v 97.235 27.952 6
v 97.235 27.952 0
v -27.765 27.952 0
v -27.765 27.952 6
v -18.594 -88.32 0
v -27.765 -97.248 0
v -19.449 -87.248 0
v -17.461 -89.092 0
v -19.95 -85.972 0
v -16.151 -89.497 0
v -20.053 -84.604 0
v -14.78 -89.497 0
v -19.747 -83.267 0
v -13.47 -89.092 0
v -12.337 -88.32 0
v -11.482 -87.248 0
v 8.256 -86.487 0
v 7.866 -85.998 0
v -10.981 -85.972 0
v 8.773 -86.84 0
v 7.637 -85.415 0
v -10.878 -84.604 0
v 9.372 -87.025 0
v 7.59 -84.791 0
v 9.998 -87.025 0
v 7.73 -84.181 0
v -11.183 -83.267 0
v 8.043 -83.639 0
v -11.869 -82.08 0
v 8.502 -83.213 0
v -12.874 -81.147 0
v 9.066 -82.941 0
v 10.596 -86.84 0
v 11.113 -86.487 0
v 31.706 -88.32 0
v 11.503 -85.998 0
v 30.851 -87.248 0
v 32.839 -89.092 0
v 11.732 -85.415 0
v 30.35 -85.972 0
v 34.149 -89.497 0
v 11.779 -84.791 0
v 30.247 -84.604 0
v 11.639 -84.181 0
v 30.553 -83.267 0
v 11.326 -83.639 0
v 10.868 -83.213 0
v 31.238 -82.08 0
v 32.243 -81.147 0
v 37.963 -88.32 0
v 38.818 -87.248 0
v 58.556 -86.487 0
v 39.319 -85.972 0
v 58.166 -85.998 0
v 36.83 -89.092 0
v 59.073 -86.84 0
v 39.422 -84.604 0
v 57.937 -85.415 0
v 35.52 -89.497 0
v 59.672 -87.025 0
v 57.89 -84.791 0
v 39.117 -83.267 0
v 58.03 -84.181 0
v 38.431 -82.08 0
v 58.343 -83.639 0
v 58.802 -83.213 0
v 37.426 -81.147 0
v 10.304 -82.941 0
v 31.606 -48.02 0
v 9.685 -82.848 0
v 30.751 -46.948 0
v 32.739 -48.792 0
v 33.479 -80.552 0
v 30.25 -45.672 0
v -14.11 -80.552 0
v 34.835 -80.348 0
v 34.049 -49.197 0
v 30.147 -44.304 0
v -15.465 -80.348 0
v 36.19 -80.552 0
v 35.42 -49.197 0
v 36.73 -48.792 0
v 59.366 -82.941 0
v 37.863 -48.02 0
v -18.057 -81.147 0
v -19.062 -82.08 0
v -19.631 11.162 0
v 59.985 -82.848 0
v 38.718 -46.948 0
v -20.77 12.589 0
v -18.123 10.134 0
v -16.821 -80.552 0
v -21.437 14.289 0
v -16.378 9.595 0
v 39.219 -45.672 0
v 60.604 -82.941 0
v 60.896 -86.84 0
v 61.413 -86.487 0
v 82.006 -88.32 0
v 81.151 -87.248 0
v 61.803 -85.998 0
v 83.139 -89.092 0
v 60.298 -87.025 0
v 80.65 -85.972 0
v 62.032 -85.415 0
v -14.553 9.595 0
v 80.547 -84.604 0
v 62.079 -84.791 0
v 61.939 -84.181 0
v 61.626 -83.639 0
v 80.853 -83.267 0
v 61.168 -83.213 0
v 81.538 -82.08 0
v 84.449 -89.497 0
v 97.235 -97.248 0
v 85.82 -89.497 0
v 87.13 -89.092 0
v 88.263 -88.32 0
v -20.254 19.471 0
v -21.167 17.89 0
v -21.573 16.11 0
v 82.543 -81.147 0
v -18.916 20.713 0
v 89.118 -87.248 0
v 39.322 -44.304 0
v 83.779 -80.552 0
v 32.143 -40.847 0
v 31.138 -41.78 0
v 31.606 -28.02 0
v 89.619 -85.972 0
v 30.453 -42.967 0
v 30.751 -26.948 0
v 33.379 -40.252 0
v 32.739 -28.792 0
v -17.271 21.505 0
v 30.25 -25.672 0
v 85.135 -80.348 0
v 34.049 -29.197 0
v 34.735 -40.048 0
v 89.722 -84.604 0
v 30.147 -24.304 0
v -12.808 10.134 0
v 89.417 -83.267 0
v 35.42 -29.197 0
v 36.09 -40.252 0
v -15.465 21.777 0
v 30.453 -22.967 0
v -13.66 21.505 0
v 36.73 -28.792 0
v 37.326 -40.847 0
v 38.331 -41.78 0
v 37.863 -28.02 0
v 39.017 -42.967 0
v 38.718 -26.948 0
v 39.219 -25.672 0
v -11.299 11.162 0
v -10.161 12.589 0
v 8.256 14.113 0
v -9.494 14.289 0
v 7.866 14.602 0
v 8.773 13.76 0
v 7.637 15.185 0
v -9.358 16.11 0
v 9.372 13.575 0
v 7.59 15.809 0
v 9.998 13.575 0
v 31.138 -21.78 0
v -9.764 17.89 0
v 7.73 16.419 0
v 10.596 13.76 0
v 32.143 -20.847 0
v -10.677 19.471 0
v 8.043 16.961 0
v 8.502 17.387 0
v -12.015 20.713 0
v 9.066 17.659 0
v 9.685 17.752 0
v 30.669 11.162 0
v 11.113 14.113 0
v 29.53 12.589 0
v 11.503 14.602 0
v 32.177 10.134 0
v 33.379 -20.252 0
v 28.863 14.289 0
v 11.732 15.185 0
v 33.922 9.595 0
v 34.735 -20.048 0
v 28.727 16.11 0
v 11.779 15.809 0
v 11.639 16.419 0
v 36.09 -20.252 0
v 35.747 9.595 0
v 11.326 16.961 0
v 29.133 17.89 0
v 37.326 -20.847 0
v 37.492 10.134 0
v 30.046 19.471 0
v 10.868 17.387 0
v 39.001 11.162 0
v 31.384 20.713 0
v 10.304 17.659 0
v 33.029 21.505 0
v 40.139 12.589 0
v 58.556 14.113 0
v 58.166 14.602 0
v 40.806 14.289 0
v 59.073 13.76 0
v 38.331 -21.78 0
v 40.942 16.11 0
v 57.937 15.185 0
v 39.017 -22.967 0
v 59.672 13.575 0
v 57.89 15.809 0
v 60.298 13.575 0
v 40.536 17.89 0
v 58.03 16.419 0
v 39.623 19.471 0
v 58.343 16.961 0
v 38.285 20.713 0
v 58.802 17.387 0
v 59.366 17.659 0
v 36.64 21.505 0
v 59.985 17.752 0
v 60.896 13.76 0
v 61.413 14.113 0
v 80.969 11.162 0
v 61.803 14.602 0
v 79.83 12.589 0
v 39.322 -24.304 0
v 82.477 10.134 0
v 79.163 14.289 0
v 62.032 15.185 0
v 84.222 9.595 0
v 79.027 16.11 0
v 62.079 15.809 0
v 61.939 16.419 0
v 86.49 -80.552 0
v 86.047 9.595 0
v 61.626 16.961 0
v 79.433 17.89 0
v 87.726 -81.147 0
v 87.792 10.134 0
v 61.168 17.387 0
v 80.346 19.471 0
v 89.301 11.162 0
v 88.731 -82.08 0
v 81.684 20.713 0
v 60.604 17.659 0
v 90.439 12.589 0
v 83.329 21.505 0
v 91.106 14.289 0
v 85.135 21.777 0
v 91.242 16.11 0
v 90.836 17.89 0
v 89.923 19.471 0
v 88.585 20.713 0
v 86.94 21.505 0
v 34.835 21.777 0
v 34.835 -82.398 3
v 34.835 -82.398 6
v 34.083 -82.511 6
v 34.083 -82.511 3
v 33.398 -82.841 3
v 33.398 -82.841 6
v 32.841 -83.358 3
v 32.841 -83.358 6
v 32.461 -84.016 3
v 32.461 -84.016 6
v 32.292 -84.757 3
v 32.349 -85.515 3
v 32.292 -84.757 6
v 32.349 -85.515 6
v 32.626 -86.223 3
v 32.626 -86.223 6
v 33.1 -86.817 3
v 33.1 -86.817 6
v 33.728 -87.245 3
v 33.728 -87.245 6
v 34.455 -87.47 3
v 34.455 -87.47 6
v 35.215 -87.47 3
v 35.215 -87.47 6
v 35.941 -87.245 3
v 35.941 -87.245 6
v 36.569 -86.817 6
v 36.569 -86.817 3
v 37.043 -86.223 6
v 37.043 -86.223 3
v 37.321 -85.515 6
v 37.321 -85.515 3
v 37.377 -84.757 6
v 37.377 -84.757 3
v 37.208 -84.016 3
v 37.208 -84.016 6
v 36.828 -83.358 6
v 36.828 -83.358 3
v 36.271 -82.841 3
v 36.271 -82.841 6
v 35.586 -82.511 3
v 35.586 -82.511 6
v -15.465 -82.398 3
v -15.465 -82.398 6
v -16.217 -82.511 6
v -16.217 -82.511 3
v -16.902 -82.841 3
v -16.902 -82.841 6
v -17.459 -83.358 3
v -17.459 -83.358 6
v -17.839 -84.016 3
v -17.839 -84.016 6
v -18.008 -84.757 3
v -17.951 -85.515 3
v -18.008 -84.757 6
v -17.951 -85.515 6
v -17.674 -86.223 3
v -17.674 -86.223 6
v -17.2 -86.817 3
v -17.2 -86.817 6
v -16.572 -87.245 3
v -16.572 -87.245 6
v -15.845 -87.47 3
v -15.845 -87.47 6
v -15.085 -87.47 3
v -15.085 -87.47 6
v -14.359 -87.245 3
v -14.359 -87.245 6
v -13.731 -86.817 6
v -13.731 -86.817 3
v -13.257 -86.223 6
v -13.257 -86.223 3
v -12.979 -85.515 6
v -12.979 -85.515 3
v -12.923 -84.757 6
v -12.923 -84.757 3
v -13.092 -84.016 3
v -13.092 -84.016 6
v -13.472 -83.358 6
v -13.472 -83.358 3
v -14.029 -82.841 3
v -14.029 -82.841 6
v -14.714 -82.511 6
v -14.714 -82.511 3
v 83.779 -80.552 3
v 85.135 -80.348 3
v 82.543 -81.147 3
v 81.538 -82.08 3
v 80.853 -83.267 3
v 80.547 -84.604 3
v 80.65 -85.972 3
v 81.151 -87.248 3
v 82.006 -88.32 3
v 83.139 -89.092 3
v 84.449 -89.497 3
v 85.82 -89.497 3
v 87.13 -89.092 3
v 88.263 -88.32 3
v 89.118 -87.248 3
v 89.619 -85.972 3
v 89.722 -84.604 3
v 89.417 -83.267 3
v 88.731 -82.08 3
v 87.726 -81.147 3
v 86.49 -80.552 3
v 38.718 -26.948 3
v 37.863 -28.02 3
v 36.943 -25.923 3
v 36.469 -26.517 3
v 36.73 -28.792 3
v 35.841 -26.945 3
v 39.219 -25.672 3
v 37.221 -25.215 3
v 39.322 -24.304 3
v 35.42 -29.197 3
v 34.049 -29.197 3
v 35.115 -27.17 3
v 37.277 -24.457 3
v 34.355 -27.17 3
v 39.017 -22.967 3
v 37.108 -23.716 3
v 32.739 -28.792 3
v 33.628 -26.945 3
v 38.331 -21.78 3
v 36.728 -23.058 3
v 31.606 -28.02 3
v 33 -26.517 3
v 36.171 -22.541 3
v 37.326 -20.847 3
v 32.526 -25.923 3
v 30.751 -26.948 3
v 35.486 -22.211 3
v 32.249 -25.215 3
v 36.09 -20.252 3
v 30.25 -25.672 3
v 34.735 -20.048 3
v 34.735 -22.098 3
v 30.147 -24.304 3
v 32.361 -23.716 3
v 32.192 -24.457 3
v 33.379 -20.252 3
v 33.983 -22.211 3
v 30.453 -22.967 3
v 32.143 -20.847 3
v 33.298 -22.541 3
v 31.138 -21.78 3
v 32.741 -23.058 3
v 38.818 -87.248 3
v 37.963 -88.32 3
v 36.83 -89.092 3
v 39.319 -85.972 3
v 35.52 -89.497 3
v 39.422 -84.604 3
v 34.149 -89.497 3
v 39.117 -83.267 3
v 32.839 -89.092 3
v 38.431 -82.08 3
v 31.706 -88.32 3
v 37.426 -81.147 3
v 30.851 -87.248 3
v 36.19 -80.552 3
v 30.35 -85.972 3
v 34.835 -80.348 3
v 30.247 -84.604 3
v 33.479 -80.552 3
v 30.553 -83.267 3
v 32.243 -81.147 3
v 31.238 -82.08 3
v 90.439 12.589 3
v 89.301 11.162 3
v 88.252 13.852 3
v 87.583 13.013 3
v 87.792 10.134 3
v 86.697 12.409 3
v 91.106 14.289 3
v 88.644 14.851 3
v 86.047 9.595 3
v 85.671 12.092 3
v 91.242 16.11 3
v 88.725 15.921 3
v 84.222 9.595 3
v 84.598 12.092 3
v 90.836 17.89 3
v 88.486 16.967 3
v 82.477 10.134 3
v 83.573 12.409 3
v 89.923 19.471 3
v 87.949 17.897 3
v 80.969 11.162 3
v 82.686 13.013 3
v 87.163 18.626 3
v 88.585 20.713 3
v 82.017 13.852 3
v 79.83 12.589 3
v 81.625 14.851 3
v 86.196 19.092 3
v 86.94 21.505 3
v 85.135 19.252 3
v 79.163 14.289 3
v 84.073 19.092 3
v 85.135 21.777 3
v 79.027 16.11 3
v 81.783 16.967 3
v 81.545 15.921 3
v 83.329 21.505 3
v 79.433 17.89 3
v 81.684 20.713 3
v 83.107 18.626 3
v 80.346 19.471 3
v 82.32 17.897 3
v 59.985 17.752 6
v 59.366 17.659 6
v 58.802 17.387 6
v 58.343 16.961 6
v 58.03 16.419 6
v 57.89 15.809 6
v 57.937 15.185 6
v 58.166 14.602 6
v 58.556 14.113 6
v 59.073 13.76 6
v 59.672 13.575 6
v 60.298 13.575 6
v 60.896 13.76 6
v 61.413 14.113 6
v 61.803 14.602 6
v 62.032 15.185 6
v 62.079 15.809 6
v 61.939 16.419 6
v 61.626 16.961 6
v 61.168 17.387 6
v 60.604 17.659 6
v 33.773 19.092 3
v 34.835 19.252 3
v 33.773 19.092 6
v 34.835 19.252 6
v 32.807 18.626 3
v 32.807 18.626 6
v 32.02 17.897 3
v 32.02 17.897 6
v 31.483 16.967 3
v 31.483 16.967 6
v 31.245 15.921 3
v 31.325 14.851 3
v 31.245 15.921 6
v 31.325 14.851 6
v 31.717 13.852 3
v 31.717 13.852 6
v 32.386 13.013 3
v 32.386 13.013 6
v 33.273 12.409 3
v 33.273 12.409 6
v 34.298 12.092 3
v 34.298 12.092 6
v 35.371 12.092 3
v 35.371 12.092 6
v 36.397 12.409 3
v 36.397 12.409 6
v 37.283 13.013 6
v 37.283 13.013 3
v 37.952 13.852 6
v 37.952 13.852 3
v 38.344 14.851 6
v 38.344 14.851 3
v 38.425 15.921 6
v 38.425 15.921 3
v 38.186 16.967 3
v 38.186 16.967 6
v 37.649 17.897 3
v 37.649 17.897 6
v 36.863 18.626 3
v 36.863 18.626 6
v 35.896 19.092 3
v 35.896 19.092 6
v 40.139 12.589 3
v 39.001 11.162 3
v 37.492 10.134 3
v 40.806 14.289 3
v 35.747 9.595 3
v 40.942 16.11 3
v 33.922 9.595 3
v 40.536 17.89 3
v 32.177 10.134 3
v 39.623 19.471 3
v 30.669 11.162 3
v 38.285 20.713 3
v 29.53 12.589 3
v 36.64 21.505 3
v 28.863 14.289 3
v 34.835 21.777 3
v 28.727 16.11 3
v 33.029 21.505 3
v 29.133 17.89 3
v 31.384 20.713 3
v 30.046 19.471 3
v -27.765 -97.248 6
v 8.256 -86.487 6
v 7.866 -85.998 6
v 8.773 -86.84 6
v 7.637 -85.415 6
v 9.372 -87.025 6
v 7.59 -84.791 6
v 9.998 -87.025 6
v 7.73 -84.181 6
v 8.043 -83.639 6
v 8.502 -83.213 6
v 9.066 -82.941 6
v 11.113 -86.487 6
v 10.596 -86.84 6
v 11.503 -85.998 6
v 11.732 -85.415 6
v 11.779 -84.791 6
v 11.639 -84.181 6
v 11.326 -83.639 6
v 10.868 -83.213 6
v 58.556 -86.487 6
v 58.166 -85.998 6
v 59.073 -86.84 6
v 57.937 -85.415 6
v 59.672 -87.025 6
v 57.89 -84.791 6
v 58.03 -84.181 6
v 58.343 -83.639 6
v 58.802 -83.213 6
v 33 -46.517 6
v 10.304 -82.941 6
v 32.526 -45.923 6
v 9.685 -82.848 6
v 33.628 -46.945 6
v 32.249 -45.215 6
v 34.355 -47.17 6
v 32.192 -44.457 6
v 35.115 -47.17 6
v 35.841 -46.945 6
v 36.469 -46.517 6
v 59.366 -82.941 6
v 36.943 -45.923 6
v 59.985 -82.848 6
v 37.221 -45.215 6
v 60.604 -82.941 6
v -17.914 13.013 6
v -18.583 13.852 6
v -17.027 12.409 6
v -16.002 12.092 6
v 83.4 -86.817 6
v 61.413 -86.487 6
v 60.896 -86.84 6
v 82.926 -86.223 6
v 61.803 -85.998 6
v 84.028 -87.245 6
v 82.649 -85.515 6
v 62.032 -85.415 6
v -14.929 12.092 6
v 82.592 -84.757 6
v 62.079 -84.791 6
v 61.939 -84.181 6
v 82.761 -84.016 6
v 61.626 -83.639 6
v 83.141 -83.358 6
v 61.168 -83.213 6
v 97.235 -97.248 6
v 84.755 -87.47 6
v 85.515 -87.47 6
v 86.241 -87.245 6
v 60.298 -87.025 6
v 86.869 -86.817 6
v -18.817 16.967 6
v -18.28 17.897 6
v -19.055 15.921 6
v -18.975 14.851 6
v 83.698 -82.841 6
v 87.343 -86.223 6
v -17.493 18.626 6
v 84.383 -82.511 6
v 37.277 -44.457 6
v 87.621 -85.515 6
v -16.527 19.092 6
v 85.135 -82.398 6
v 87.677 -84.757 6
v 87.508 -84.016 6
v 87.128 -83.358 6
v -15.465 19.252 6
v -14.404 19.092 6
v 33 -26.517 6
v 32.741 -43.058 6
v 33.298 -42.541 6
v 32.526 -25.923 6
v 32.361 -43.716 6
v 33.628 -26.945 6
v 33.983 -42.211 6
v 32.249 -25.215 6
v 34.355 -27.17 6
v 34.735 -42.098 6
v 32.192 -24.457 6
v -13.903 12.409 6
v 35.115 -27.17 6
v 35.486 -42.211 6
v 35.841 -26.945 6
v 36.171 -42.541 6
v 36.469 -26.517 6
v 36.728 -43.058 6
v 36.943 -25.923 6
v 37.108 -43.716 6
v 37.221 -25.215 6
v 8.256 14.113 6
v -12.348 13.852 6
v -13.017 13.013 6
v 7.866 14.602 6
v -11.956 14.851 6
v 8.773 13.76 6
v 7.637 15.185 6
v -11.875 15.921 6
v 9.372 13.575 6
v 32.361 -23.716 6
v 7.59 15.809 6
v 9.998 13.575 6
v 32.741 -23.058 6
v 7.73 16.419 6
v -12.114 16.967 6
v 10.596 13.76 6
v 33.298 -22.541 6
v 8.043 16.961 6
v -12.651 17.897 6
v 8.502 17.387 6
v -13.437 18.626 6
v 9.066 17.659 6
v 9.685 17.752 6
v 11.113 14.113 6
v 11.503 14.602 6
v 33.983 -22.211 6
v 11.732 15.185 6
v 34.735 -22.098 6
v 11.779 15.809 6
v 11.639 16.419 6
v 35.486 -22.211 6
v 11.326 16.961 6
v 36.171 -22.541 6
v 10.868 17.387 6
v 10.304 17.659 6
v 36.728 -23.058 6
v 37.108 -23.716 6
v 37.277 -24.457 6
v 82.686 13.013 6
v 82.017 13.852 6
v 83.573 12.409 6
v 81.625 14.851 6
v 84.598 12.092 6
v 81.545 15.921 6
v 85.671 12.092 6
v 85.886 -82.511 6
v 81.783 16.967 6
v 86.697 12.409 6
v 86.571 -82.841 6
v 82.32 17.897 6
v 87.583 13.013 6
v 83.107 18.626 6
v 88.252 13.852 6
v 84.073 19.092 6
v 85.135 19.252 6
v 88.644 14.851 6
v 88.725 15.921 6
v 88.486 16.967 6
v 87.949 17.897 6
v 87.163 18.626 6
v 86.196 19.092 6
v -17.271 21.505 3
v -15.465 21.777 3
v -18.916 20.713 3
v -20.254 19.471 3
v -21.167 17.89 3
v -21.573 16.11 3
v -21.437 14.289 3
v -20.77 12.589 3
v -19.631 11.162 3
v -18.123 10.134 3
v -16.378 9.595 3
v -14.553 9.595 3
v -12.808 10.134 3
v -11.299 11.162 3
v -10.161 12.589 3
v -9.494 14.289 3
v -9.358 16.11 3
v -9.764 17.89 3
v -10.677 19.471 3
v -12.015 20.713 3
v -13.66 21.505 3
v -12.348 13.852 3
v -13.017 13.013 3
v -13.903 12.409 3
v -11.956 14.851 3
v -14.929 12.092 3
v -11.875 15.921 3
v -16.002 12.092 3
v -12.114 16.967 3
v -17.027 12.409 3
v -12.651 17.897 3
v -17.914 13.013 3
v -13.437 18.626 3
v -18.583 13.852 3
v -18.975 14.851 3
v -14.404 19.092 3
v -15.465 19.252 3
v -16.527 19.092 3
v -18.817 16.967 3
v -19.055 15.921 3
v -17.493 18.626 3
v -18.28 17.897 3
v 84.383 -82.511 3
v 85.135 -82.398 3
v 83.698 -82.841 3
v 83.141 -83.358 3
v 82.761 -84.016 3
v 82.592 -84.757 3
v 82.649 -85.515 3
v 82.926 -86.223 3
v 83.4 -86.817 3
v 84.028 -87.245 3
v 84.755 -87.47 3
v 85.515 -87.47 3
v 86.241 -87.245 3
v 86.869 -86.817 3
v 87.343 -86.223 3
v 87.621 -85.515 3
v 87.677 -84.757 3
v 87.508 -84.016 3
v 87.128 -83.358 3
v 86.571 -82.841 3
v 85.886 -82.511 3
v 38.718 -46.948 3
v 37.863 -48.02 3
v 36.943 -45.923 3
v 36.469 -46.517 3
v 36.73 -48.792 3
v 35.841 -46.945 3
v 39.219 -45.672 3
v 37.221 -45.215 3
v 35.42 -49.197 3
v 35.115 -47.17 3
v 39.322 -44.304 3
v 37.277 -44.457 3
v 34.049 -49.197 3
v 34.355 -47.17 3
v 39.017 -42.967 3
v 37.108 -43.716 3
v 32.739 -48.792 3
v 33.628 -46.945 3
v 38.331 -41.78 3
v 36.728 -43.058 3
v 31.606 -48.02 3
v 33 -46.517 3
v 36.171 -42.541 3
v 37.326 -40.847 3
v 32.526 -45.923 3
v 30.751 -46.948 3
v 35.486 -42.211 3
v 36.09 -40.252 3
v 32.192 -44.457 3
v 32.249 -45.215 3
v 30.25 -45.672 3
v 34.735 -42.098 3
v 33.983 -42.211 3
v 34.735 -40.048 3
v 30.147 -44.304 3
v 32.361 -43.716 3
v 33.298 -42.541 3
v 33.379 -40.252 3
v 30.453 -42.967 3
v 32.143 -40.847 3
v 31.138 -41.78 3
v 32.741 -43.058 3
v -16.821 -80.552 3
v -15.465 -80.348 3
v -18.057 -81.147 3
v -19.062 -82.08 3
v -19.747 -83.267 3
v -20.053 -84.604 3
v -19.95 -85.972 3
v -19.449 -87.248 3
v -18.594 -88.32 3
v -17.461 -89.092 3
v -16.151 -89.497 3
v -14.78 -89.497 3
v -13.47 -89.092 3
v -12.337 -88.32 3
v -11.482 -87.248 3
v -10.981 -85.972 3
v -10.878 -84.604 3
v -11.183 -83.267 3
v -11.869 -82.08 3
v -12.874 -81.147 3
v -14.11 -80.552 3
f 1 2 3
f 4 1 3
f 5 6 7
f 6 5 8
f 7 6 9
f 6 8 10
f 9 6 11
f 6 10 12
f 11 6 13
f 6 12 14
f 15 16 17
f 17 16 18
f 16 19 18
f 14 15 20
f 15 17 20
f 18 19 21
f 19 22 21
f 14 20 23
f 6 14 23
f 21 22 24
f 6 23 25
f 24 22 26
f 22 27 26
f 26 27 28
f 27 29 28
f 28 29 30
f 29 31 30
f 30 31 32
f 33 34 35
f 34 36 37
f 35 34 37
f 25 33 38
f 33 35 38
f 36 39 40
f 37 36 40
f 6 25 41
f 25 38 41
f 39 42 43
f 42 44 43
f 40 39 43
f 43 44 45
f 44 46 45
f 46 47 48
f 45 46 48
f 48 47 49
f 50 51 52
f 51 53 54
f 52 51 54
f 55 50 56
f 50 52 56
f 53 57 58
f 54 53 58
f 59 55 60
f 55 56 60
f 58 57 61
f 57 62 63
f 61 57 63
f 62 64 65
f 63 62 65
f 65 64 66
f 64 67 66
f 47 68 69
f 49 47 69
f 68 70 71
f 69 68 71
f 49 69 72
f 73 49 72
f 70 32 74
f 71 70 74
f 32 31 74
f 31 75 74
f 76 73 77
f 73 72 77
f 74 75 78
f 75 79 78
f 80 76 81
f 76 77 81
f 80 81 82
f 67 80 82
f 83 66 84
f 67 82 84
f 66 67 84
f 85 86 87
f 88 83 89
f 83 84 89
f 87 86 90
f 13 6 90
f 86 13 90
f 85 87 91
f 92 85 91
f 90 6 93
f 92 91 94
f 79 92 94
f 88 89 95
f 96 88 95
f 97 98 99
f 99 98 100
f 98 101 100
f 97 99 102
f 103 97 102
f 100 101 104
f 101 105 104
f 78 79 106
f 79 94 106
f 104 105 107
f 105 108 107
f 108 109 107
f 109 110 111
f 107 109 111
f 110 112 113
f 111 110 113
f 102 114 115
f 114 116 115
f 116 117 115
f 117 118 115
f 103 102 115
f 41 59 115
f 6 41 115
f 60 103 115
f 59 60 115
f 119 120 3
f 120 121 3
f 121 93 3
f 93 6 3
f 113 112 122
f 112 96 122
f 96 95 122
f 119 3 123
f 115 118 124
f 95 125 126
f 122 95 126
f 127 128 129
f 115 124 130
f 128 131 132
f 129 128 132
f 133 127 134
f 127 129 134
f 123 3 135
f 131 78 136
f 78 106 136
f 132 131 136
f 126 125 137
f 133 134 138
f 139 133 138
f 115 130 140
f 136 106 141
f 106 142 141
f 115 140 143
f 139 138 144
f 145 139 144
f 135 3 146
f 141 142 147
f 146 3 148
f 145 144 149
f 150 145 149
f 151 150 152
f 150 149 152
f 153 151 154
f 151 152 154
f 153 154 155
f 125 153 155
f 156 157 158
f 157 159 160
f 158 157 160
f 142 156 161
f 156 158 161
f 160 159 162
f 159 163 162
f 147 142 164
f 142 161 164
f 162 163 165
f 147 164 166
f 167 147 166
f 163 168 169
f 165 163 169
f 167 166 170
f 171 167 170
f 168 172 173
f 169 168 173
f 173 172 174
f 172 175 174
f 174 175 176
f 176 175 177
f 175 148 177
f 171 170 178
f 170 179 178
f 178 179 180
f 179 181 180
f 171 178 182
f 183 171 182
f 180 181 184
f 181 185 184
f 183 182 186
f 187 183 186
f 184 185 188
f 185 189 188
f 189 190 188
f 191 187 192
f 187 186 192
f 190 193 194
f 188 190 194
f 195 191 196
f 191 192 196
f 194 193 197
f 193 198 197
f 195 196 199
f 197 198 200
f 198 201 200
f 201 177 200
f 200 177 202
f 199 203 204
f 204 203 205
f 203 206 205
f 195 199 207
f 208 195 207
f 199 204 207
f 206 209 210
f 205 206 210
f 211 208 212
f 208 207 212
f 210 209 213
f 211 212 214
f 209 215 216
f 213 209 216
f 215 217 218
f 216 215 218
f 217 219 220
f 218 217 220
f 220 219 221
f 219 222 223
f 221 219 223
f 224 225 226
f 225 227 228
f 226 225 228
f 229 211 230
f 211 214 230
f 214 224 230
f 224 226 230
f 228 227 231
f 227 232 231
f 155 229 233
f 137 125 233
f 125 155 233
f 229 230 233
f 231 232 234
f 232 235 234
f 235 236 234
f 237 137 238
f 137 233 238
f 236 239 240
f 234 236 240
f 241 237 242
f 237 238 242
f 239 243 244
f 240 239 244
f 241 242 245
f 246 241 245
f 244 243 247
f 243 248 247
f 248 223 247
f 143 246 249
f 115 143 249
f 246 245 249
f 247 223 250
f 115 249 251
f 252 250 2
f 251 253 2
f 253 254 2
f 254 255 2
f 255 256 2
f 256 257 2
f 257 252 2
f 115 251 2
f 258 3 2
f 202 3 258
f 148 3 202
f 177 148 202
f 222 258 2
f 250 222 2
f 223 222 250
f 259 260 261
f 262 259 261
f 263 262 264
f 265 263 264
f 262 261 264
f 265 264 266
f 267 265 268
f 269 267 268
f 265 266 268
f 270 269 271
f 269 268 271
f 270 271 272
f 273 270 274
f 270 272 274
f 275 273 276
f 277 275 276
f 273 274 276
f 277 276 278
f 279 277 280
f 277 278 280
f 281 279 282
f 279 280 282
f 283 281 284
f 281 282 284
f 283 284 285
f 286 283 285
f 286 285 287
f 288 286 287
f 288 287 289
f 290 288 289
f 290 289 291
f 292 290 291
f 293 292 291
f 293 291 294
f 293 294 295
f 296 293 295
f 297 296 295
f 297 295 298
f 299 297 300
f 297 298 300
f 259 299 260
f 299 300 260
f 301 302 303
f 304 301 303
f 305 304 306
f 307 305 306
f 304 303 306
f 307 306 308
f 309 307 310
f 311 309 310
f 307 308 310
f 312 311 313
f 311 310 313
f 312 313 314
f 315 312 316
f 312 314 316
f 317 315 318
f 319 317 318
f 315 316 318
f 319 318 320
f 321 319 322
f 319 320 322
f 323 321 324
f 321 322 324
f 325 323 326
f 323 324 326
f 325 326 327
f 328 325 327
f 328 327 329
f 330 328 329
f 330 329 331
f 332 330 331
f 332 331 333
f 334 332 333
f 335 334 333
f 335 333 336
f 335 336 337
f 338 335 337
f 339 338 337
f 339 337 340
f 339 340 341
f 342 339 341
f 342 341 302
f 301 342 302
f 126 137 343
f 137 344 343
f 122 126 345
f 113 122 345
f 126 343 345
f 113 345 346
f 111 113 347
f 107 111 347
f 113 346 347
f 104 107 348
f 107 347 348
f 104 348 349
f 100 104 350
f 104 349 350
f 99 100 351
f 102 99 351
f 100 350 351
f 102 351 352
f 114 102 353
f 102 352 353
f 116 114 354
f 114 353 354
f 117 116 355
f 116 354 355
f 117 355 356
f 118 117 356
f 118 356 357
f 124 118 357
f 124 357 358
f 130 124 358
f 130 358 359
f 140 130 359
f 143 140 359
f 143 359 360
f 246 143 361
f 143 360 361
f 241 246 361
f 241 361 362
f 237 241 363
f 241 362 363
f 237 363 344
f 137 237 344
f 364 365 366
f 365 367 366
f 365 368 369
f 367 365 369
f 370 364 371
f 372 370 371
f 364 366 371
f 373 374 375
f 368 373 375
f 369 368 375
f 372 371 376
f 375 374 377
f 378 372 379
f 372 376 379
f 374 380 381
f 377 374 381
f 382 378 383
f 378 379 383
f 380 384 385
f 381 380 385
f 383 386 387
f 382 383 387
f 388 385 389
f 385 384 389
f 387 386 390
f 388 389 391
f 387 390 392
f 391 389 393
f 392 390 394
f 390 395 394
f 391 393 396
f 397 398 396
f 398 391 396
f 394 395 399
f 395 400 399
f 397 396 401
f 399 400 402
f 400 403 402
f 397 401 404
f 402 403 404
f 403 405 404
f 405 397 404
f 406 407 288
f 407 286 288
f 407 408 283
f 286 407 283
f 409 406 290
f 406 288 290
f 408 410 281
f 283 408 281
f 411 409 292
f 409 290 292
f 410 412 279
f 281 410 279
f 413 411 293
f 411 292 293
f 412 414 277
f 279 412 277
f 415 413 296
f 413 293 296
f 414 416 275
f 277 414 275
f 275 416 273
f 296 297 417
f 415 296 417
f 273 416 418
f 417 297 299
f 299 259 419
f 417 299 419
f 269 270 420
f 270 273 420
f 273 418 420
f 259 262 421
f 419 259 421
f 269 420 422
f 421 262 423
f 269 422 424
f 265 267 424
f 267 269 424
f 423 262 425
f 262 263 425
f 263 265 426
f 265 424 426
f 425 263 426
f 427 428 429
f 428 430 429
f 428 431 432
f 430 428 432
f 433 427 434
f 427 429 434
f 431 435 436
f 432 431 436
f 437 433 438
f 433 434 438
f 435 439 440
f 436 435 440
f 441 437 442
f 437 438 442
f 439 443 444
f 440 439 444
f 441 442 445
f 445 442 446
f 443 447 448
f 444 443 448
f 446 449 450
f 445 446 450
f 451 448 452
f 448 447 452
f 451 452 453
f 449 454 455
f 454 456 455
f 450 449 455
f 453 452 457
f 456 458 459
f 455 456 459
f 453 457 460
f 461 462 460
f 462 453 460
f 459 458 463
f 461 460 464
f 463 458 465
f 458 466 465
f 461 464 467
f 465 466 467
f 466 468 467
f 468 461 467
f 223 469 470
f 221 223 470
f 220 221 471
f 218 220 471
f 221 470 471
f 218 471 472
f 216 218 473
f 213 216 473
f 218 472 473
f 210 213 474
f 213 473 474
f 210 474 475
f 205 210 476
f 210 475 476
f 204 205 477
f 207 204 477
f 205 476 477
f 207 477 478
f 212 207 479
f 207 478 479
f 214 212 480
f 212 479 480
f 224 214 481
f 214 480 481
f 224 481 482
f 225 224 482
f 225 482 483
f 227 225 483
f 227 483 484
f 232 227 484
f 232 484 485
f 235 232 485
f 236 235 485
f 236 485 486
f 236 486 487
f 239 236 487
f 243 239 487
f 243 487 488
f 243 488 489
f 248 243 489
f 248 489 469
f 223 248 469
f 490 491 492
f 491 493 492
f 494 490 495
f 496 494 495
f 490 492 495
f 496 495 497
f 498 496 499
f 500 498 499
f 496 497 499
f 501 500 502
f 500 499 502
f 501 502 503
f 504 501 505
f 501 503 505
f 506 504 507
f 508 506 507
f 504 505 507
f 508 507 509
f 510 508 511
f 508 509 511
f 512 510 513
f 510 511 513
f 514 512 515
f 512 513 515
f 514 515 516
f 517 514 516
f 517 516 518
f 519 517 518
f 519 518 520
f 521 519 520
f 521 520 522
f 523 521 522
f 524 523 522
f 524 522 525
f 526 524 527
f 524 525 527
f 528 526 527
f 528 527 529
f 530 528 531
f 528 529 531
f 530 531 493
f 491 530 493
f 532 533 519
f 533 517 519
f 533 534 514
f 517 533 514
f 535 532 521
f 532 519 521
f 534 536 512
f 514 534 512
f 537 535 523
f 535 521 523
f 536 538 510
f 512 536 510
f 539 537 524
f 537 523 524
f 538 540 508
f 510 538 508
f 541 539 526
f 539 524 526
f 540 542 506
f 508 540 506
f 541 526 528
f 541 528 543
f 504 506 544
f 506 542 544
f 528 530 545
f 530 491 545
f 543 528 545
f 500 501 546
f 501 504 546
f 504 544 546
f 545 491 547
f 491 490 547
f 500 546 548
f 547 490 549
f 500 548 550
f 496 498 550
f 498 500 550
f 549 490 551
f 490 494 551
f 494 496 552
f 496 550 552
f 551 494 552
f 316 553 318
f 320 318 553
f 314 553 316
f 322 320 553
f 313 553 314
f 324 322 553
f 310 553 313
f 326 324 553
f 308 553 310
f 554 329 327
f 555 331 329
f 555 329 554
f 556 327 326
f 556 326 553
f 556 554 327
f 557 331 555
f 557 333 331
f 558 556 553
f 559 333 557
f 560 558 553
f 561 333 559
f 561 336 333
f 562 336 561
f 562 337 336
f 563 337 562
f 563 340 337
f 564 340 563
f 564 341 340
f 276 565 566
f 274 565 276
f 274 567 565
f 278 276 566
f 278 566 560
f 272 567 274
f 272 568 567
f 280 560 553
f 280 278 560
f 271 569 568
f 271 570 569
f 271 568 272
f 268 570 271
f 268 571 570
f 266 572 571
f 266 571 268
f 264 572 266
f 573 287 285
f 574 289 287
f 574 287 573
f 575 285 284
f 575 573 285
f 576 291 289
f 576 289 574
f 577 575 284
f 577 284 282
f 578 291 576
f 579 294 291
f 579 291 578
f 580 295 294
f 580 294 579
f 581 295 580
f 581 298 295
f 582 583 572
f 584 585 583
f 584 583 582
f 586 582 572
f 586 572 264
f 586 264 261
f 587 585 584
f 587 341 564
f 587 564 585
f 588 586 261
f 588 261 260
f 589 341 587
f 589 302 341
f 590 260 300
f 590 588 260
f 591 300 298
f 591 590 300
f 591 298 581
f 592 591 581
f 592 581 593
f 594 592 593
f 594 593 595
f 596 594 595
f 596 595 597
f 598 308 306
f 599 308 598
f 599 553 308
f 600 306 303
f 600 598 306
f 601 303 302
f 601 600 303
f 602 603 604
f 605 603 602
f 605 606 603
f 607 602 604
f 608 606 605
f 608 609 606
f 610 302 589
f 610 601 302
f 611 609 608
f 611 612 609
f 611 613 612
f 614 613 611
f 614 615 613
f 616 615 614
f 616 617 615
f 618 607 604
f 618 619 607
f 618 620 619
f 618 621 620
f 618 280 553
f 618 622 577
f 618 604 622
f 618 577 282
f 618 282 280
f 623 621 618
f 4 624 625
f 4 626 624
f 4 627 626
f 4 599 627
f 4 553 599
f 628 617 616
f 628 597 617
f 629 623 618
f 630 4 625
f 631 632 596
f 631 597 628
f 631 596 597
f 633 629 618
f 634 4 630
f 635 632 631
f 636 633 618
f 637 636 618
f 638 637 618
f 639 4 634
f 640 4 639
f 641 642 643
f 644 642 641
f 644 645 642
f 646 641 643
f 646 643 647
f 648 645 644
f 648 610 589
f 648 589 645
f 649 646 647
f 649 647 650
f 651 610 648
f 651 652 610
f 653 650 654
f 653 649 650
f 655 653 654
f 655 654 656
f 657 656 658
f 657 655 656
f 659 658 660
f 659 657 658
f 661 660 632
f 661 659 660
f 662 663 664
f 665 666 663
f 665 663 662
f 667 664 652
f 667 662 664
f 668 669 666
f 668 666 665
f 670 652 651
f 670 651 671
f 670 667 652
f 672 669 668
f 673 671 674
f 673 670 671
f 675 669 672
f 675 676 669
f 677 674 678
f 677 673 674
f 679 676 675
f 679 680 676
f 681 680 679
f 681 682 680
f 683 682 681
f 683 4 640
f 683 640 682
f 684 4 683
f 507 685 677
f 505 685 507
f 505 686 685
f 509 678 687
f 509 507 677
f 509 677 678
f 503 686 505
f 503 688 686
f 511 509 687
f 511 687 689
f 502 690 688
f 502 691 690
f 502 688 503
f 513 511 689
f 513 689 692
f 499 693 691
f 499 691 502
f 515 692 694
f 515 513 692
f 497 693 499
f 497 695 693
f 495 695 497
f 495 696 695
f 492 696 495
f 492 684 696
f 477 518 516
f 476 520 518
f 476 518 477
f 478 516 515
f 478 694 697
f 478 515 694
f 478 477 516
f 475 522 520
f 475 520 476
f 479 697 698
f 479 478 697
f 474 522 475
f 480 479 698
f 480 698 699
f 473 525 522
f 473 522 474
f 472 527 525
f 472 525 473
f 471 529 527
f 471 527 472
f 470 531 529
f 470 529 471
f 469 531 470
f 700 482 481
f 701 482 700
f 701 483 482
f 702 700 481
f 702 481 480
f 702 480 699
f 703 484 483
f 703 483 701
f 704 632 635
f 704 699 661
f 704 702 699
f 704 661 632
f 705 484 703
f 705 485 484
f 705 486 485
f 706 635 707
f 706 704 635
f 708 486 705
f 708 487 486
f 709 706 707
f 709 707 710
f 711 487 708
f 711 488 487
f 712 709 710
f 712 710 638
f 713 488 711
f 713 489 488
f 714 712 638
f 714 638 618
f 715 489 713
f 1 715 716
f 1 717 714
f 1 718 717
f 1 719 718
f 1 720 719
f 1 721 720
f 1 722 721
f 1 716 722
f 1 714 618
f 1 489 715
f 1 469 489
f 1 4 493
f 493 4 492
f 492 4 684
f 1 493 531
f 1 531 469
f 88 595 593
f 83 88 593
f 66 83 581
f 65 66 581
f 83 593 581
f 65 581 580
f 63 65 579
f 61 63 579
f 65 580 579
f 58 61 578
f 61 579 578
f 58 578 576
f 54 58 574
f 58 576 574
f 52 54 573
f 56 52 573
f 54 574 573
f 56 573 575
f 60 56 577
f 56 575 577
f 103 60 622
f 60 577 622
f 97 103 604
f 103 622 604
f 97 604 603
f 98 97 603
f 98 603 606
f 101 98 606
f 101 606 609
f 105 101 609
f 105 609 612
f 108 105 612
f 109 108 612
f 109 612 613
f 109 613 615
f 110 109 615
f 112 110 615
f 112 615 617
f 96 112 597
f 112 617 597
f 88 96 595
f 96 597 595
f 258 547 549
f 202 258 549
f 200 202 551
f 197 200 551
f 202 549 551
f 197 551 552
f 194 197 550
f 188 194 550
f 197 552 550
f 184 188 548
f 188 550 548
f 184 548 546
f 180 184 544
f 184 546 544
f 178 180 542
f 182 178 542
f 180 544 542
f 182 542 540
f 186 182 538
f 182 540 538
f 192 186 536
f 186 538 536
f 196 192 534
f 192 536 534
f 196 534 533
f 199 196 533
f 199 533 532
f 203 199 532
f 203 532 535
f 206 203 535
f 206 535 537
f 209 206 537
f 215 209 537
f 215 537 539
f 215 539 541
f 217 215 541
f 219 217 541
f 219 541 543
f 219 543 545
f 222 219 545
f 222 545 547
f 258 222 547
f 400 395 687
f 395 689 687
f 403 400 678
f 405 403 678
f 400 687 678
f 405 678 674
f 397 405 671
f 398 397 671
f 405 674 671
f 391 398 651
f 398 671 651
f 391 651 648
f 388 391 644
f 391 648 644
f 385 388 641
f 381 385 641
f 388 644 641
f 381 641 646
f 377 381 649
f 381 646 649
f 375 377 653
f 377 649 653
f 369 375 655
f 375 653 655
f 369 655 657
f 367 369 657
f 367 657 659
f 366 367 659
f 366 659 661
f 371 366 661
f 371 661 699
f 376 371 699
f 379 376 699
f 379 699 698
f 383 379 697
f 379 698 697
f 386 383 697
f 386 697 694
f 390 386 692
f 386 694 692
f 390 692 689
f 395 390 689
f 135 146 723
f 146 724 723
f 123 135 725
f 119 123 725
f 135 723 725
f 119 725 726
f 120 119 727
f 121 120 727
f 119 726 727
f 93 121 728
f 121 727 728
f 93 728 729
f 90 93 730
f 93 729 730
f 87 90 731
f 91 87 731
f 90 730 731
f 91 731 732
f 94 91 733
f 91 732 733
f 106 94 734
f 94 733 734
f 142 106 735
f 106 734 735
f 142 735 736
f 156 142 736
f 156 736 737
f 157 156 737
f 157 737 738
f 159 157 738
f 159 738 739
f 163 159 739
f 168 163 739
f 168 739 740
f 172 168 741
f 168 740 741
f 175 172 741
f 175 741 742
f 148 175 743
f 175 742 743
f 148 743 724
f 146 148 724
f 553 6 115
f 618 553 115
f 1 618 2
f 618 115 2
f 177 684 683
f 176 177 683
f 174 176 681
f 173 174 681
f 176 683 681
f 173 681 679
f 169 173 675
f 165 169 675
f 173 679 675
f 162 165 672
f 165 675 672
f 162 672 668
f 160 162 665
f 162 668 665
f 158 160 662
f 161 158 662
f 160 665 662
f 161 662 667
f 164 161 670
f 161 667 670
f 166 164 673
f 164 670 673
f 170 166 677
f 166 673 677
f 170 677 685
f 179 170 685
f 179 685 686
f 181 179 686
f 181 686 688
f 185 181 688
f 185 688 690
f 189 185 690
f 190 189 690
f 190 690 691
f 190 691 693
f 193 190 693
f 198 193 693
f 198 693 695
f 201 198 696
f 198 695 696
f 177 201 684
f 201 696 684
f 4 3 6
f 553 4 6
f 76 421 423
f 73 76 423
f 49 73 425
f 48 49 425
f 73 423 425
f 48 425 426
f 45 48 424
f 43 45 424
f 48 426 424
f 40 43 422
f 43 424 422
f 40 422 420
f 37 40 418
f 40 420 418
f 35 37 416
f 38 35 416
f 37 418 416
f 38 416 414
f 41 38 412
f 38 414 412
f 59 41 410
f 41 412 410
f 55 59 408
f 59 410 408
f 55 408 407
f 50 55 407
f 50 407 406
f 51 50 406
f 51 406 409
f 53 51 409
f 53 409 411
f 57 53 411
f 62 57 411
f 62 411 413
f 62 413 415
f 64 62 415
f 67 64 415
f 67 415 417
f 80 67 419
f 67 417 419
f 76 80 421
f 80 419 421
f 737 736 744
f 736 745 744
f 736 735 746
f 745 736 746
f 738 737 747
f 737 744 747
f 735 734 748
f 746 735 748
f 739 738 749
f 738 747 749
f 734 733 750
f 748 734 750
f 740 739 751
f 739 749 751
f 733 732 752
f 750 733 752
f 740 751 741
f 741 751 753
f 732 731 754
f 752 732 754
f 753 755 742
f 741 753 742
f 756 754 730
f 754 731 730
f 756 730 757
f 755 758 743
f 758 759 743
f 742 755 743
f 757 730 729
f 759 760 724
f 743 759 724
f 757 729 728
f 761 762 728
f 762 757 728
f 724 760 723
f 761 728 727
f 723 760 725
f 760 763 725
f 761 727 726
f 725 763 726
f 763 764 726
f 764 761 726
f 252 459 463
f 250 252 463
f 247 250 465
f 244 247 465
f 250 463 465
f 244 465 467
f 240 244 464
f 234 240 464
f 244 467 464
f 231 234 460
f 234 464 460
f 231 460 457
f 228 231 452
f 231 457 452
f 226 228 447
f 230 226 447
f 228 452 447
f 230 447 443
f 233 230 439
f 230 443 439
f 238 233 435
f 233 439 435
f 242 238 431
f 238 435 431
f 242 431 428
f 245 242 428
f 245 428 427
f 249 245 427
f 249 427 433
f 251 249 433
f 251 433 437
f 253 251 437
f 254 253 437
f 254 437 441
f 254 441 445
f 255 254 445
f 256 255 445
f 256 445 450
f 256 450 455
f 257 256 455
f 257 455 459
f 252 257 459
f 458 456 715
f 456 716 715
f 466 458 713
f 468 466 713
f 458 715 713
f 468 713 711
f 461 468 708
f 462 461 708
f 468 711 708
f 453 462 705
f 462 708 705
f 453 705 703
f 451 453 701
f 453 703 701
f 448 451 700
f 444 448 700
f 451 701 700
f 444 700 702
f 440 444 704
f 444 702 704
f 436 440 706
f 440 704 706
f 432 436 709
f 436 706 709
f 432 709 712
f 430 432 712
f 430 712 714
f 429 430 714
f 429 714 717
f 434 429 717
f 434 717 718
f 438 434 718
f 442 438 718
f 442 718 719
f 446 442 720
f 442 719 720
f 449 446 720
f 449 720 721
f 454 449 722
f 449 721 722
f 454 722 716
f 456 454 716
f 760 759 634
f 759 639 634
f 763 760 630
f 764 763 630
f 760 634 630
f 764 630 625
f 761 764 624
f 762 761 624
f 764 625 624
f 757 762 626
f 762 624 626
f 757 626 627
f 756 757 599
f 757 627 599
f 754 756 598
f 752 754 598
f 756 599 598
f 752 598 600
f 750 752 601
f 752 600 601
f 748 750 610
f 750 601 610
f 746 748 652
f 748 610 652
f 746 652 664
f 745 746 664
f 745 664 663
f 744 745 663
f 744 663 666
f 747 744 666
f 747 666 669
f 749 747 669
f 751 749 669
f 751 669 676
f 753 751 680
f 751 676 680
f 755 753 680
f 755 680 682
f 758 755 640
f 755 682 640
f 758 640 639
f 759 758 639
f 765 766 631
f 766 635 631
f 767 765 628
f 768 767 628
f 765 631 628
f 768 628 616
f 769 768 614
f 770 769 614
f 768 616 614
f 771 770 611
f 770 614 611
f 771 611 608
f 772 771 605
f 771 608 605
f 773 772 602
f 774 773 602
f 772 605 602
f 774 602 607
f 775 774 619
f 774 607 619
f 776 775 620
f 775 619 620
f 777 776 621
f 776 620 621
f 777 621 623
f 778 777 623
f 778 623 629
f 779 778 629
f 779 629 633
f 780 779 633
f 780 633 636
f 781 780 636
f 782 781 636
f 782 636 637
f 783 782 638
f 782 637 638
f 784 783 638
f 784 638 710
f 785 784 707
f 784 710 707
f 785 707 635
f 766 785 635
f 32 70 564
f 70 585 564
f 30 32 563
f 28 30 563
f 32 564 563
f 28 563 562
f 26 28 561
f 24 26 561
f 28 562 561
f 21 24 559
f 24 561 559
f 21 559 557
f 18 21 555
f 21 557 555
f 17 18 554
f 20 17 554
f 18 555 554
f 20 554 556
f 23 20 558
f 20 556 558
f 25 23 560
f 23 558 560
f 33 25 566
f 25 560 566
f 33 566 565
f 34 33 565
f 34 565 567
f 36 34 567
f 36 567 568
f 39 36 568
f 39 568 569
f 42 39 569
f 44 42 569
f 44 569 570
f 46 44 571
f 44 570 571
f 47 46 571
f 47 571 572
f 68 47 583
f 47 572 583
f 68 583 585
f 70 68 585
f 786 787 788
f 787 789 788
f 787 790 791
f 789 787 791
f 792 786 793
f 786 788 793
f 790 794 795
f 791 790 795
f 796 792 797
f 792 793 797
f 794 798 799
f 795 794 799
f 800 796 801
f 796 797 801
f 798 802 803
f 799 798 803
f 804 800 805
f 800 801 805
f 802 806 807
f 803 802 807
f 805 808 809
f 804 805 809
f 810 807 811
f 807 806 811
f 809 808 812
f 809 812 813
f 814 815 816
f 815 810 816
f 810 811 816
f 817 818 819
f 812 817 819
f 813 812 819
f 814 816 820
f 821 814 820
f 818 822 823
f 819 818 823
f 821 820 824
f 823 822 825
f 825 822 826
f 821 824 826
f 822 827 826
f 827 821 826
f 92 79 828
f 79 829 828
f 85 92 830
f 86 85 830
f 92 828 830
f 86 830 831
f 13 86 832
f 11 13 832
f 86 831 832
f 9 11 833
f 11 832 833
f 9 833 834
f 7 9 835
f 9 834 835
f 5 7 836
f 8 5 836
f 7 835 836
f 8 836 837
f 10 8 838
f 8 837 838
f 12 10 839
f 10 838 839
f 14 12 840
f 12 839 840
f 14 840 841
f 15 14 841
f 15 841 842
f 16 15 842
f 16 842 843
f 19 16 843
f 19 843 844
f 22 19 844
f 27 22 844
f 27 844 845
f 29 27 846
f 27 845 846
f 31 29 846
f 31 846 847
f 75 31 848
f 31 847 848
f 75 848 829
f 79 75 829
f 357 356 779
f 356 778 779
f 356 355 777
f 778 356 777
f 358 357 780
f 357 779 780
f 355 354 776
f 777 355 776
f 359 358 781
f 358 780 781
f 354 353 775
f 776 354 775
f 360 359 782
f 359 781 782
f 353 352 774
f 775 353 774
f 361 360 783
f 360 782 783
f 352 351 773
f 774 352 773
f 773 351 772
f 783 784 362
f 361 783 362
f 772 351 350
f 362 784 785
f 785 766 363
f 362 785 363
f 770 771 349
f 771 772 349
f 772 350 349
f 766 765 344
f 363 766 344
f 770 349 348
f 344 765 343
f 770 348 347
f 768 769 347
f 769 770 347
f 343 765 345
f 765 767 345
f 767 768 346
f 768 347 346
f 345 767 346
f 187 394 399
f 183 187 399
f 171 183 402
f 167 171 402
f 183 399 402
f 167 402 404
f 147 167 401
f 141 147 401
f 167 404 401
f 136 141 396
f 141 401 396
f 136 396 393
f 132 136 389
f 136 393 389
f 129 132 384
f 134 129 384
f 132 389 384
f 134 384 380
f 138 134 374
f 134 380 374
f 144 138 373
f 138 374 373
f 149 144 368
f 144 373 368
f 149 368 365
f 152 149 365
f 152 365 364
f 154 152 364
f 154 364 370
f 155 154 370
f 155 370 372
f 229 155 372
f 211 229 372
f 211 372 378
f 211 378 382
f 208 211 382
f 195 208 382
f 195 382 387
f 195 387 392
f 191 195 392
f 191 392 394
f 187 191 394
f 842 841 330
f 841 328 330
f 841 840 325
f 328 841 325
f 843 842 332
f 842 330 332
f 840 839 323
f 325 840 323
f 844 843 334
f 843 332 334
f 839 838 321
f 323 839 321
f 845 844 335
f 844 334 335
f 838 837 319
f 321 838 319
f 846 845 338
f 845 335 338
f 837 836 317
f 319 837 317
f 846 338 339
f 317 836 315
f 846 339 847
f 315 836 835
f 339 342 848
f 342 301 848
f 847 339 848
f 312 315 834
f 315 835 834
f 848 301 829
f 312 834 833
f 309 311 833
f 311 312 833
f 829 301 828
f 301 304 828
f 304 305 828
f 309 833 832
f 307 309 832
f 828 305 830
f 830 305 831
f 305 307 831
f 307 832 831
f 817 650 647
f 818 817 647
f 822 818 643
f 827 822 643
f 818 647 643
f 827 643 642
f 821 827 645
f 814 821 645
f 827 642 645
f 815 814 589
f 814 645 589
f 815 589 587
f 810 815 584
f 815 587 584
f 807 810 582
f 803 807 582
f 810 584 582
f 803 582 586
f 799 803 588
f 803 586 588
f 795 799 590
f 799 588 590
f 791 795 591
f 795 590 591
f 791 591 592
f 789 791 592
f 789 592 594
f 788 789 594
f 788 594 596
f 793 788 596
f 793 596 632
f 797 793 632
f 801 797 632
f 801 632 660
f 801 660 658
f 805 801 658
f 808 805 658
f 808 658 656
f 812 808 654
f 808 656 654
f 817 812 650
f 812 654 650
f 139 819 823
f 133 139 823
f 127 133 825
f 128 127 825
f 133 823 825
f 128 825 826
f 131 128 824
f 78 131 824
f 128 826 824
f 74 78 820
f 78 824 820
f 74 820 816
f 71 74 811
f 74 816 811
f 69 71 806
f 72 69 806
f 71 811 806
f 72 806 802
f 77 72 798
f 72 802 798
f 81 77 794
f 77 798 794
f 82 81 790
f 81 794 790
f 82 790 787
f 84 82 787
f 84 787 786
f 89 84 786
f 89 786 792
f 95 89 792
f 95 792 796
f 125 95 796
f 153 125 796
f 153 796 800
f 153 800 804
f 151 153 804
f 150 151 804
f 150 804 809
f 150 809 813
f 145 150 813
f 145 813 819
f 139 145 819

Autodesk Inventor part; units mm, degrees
ref_plane "YZ Plane" through (0, 0, 0) normal (1, 0, 0) x (0, 1, 0)
ref_plane "XZ Plane" through (0, 0, 0) normal (0, 1, 0) x (-1, 0, 0)
ref_plane "XY Plane" through (0, 0, 0) normal (0, 0, 1) x (1, 0, 0)
sketch "Sketch1" plane through (0, 0, 0) normal (0, 0, 1) x (1, 0, 0)
  line L0 (97.2346, 27.952) -> (-27.7654, 27.952)
  line L1 (-27.7654, 27.952) -> (-27.7654, -97.248)
  line L2 (-27.7654, -97.248) -> (97.2346, -97.248)
  line L3 (97.2346, -97.248) -> (97.2346, 27.952)
  line L4 (85.1346, 27.952) -> (85.1346, -97.248) construction
  line L5 (-15.4654, 27.952) -> (-15.4654, -97.248) construction
  line L6 (-37.3152, 15.652) -> (117.1466, 15.652) construction
  line L7 (115.2487, -84.948) -> (-56.3615, -84.948) construction
  line L8 (34.8346, -156.7023) -> (34.8346, 57.8793) construction
  line L9 (59.9846, 68.2484) -> (59.9846, -132.2245) construction
  line L10 (9.6846, 55.4717) -> (9.6846, -128.574) construction
  point P0 (0, 0)
  point P1 (-65.7997, 171.2688)
  point P2 (85.1346, -84.948)
  point P3 (85.1346, 15.652)
  point P4 (-15.4654, 15.652)
  point P5 (-15.4654, -84.948)
  point P6 (34.8346, -84.948)
  point P7 (34.8346, 15.652)
  point P8 (59.9846, 15.652)
  point P9 (9.6846, 15.652)
  point P10 (59.9846, -84.948)
  point P11 (9.6846, -84.948)
  dimension "d0" = 125
  dimension "d1" = 125.2
  dimension "d6" = 100.6
  dimension "d48" = 12.3
  dimension "d49" = 100.6
  dimension "d50" = 50.3
  dimension "d72" = 25.15
  dimension "d73" = 25.15
extrude "Extrusion1" add sketch "Sketch1" along normal blind 6
hole "Hole6" at (85.1346, -84.948, 0) at (34.8346, -84.948, 0) at (-15.4654, -84.948, 0) direction (0, 0, 1) diameter 5.1 end through all counterbore diameter 9.2 counterbore depth 3
sketch "Sketch2" plane through (0, 0, 6) normal (0, 0, 1) x (1, 0, 0)
  line L0 (86.1945, -57.9789) -> (32.1694, -57.9789) construction
  line L1 (32.1694, -57.9789) -> (32.1694, -50.1092) construction
  line L2 (32.1694, -50.1092) -> (86.1945, -50.1092) construction
  line L3 (86.1945, -50.1092) -> (86.1945, -57.9789) construction
  point P0 (0, 0)
sketch "Sketch3" plane through (0, 0, 0) normal (0, 0, -1) x (-1, 0, 0)
  point P0 (0, 0)
hole "Hole7" at (85.1346, 15.652, 0) at (34.8346, 15.652, 0) at (-15.4654, 15.652, 0) direction (0, 0, 1) diameter 7.2 end through all counterbore diameter 12.25 counterbore depth 3
sketch "Sketch5" plane through (0, 0, 0) normal (0, 0, -1) x (-1, 0, 0)
  line L0 (27.7654, -97.248) -> (-97.2346, -97.248) construction
  line L1 (-97.2346, -97.248) -> (-97.2346, 27.952) construction
  line L2 (27.7654, 27.952) -> (27.7654, -97.248) construction
  line L3 (-97.2346, 27.952) -> (27.7654, 27.952) construction
  line L4 (-97.2346, -97.248) -> (-97.2346, 27.952) construction
  line L5 (-97.2346, -34.648) -> (27.7654, -34.648) construction
  line L6 (27.7654, 27.952) -> (27.7654, -97.248) construction
  line L7 (-97.2346, -44.648) -> (27.7654, -44.648) construction
  line L8 (-97.2346, -24.648) -> (27.7654, -24.648) construction
  line L9 (27.7654, -97.248) -> (-97.2346, -97.248) construction
  line L10 (-34.7346, -97.248) -> (-34.7346, 27.952) construction
  line L11 (-97.2346, 27.952) -> (27.7654, 27.952) construction
  point P0 (0, 0)
  point P1 (-34.7346, -44.648)
  point P2 (-34.7346, -24.648)
  dimension "d81" = 10
  dimension "d82" = 10
hole "Hole8" at (34.7346, -44.648, 0) at (34.7346, -24.648, 0) direction (0, 0, 1) diameter 5.1 end through all counterbore diameter 9.2 counterbore depth 3
hole "Hole9" at (59.9846, 15.652, 0) at (9.6846, 15.652, 0) at (59.9846, -84.948, 0) at (9.6846, -84.948, 0) direction (0, 0, 1) diameter 4.2 end through all
equation "\"d72\" = 0.5 * d50"
equation "\"d73\" = 0.5 * d50"
properties part number "X axis carriage small_3DPrint"
